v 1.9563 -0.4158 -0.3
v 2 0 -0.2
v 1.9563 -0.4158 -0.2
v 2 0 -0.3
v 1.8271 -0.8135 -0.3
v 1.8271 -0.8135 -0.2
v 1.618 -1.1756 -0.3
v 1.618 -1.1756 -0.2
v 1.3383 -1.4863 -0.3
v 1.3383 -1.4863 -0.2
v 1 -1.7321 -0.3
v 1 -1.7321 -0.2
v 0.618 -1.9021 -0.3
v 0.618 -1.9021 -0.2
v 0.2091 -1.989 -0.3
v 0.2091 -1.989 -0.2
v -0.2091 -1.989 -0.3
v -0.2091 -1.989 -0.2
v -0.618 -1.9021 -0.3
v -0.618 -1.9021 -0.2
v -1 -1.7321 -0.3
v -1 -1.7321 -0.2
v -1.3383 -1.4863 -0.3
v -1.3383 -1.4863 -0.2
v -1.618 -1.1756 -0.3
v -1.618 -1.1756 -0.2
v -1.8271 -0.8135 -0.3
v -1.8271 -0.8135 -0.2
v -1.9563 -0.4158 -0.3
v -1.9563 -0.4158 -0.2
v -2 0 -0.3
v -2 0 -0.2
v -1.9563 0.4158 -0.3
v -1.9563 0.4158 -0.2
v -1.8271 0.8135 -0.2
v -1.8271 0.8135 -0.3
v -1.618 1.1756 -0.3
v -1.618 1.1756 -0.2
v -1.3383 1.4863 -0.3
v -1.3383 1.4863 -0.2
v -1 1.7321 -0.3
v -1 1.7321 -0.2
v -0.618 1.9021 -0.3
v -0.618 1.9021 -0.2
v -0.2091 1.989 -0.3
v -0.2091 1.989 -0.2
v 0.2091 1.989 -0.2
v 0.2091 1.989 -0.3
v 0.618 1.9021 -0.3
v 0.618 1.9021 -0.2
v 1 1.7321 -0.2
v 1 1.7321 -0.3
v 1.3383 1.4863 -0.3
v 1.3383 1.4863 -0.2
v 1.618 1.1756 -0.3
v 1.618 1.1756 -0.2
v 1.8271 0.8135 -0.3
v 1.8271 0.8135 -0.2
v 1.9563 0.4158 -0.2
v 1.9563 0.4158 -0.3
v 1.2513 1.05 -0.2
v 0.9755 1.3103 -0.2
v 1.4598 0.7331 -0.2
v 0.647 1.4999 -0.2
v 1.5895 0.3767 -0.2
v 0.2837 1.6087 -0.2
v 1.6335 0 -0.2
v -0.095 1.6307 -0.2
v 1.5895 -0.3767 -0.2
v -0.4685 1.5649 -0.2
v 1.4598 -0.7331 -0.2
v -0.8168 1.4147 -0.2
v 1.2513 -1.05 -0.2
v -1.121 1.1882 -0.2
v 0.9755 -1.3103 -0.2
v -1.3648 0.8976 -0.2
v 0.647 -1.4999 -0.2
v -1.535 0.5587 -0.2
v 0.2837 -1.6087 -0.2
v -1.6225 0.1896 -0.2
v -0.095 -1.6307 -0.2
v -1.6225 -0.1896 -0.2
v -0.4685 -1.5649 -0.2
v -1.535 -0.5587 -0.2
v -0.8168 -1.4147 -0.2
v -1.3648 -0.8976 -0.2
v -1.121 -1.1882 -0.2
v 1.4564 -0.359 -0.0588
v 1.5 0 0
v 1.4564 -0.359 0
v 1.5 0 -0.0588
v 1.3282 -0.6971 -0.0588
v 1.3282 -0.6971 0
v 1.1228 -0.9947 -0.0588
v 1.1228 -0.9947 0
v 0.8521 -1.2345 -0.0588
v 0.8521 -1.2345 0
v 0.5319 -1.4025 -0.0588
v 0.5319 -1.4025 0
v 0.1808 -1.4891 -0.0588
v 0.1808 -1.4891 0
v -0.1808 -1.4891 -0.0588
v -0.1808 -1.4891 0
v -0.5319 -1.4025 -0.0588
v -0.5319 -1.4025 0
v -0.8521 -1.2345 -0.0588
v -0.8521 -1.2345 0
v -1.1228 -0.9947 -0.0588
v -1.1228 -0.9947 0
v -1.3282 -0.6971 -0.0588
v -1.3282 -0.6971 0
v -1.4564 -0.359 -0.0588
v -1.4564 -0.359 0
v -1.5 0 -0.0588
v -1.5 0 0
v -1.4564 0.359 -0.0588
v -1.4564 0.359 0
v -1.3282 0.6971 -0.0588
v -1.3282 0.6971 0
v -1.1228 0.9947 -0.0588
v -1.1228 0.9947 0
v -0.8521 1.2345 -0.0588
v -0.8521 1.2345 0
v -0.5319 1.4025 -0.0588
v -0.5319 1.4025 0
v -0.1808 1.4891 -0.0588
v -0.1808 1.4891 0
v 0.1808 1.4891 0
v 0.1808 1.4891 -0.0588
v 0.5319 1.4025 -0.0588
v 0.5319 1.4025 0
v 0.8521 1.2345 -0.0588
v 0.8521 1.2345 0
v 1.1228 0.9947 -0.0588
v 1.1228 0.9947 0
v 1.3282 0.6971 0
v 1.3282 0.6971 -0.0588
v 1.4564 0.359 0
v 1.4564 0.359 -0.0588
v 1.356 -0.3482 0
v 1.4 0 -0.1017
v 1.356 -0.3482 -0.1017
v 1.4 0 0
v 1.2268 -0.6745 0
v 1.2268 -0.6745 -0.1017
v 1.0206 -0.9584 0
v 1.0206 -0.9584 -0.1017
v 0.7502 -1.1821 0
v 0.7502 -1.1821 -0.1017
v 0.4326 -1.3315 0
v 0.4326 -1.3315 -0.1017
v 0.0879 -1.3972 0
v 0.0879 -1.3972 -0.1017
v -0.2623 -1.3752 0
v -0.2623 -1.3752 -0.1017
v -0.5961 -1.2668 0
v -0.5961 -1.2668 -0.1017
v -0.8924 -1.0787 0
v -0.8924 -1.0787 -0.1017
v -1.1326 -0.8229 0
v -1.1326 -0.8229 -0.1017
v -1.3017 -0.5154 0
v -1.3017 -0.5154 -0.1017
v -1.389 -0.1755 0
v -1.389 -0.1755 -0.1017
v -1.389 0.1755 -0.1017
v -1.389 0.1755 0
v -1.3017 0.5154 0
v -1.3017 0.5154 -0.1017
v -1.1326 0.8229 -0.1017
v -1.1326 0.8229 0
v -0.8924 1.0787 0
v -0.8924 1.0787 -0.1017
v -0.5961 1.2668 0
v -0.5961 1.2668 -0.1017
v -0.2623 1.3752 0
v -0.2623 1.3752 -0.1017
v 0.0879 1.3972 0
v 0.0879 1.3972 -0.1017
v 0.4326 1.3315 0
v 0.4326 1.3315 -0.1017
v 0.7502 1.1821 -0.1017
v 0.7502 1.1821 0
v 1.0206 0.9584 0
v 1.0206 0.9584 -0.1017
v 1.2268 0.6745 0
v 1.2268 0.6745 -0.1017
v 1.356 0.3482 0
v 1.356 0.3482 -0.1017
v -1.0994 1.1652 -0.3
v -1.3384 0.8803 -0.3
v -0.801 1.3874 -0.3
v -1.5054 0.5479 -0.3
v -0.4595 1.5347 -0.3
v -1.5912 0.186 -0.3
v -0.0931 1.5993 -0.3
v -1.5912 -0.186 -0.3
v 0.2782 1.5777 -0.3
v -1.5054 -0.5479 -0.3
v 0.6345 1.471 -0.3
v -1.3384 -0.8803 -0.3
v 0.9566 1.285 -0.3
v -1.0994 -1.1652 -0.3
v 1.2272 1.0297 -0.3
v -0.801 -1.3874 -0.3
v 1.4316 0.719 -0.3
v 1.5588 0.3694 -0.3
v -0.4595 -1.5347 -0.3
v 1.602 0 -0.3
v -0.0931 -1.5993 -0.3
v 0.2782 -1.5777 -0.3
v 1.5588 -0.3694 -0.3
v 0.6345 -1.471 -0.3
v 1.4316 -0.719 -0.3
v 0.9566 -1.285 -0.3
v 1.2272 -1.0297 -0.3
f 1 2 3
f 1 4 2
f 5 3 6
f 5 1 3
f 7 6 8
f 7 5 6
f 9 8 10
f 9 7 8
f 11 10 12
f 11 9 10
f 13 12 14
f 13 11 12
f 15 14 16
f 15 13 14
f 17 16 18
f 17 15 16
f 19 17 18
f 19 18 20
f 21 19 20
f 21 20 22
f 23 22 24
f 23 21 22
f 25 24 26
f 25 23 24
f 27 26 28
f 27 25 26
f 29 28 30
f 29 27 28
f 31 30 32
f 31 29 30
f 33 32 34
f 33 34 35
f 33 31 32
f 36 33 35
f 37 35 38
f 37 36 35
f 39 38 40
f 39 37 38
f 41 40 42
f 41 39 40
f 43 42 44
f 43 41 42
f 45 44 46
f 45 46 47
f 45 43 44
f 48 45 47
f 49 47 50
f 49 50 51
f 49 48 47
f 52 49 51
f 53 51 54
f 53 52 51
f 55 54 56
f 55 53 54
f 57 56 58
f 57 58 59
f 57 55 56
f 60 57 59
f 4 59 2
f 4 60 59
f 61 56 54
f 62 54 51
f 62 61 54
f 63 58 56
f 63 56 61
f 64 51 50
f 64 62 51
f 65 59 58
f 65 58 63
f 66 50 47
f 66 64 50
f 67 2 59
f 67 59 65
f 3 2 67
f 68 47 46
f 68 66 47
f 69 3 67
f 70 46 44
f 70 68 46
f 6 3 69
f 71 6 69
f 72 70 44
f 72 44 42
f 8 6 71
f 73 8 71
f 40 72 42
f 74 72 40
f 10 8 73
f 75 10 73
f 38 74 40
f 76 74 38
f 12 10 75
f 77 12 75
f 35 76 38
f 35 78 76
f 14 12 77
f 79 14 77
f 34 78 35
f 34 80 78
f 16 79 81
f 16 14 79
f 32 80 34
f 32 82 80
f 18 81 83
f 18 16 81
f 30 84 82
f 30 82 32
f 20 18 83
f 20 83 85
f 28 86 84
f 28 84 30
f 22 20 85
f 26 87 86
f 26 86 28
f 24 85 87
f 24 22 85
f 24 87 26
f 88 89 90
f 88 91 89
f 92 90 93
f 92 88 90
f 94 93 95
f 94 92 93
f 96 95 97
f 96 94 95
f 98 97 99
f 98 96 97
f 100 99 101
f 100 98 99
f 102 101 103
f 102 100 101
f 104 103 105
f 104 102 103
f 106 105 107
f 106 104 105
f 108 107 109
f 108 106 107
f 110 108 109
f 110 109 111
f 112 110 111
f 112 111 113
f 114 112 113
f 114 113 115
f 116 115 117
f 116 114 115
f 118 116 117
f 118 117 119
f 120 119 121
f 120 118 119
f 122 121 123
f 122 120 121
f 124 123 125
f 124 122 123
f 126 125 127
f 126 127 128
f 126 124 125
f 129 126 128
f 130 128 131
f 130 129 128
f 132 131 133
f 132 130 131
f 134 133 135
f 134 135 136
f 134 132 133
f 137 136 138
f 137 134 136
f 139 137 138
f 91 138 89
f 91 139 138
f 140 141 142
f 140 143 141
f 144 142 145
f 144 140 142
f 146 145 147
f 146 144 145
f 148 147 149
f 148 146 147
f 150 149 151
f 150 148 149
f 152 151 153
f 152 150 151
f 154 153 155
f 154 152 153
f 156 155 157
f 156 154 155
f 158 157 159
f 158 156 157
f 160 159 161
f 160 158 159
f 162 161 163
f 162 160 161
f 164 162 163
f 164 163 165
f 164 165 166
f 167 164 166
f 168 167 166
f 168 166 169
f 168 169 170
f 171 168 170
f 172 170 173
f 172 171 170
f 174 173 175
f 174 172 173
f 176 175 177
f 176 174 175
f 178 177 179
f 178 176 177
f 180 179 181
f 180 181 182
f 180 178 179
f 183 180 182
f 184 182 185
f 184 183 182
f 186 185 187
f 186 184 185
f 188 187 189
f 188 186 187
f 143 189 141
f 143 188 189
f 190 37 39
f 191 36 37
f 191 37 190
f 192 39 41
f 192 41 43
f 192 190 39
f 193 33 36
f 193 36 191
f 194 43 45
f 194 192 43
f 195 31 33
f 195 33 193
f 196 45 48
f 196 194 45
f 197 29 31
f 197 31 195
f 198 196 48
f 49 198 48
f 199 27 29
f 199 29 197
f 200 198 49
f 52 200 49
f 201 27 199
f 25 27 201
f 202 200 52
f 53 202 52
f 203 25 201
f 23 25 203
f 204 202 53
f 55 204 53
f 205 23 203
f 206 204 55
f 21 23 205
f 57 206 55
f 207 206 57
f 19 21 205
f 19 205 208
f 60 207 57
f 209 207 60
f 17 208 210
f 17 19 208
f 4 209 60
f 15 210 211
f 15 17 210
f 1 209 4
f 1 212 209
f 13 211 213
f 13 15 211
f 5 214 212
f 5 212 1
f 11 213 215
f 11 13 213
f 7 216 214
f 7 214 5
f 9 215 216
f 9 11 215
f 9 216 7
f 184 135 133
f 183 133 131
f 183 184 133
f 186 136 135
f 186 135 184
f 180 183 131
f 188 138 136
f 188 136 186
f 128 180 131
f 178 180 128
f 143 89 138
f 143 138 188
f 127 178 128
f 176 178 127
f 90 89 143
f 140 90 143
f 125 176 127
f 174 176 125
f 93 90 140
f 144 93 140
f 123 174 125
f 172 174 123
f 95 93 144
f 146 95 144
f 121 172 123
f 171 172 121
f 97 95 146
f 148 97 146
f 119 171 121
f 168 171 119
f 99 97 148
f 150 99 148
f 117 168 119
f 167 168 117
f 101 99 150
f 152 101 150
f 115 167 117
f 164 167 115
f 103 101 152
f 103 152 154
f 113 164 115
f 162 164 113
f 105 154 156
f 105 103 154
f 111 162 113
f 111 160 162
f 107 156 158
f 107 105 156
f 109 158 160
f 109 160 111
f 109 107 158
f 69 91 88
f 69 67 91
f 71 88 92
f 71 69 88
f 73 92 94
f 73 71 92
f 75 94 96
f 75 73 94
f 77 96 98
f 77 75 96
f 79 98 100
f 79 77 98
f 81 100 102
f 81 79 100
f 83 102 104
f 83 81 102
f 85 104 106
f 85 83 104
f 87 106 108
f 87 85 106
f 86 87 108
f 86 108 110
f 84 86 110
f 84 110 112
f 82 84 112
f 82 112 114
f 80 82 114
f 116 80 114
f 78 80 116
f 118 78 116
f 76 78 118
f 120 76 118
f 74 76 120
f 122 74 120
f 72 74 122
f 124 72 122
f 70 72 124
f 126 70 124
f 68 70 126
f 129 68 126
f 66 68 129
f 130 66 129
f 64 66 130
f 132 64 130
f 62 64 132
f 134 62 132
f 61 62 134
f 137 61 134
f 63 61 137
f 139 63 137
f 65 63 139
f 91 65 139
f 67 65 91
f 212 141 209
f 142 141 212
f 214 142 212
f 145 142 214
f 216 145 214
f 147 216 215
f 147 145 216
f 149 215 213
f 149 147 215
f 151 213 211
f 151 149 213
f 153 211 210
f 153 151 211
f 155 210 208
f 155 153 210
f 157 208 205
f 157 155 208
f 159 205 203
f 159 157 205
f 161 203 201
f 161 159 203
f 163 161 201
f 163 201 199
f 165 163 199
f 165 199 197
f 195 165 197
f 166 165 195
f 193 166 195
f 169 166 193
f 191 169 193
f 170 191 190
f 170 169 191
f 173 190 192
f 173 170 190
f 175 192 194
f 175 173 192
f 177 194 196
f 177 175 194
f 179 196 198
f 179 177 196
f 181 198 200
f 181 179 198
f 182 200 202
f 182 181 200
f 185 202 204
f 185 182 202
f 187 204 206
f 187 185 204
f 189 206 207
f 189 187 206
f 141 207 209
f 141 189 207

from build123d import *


with BuildPart() as part:
    # Sketch1 → Revolve1 (revolve)
    with BuildSketch(Plane(origin=(0, 0, 0), x_dir=(1, 0, 0), z_dir=(0, 1, 0))):
        Polygon((1.5, 0), (1.5, 0.058756175), (1.633505434, 0.2), (2, 0.2), (2, 0.3), (1.601991028, 0.3), (1.4, 0.101718501), (1.4, 0), align=None)
    revolve(axis=Axis((0, 0, 0), (0, 0, -1)))


solid = part.part
